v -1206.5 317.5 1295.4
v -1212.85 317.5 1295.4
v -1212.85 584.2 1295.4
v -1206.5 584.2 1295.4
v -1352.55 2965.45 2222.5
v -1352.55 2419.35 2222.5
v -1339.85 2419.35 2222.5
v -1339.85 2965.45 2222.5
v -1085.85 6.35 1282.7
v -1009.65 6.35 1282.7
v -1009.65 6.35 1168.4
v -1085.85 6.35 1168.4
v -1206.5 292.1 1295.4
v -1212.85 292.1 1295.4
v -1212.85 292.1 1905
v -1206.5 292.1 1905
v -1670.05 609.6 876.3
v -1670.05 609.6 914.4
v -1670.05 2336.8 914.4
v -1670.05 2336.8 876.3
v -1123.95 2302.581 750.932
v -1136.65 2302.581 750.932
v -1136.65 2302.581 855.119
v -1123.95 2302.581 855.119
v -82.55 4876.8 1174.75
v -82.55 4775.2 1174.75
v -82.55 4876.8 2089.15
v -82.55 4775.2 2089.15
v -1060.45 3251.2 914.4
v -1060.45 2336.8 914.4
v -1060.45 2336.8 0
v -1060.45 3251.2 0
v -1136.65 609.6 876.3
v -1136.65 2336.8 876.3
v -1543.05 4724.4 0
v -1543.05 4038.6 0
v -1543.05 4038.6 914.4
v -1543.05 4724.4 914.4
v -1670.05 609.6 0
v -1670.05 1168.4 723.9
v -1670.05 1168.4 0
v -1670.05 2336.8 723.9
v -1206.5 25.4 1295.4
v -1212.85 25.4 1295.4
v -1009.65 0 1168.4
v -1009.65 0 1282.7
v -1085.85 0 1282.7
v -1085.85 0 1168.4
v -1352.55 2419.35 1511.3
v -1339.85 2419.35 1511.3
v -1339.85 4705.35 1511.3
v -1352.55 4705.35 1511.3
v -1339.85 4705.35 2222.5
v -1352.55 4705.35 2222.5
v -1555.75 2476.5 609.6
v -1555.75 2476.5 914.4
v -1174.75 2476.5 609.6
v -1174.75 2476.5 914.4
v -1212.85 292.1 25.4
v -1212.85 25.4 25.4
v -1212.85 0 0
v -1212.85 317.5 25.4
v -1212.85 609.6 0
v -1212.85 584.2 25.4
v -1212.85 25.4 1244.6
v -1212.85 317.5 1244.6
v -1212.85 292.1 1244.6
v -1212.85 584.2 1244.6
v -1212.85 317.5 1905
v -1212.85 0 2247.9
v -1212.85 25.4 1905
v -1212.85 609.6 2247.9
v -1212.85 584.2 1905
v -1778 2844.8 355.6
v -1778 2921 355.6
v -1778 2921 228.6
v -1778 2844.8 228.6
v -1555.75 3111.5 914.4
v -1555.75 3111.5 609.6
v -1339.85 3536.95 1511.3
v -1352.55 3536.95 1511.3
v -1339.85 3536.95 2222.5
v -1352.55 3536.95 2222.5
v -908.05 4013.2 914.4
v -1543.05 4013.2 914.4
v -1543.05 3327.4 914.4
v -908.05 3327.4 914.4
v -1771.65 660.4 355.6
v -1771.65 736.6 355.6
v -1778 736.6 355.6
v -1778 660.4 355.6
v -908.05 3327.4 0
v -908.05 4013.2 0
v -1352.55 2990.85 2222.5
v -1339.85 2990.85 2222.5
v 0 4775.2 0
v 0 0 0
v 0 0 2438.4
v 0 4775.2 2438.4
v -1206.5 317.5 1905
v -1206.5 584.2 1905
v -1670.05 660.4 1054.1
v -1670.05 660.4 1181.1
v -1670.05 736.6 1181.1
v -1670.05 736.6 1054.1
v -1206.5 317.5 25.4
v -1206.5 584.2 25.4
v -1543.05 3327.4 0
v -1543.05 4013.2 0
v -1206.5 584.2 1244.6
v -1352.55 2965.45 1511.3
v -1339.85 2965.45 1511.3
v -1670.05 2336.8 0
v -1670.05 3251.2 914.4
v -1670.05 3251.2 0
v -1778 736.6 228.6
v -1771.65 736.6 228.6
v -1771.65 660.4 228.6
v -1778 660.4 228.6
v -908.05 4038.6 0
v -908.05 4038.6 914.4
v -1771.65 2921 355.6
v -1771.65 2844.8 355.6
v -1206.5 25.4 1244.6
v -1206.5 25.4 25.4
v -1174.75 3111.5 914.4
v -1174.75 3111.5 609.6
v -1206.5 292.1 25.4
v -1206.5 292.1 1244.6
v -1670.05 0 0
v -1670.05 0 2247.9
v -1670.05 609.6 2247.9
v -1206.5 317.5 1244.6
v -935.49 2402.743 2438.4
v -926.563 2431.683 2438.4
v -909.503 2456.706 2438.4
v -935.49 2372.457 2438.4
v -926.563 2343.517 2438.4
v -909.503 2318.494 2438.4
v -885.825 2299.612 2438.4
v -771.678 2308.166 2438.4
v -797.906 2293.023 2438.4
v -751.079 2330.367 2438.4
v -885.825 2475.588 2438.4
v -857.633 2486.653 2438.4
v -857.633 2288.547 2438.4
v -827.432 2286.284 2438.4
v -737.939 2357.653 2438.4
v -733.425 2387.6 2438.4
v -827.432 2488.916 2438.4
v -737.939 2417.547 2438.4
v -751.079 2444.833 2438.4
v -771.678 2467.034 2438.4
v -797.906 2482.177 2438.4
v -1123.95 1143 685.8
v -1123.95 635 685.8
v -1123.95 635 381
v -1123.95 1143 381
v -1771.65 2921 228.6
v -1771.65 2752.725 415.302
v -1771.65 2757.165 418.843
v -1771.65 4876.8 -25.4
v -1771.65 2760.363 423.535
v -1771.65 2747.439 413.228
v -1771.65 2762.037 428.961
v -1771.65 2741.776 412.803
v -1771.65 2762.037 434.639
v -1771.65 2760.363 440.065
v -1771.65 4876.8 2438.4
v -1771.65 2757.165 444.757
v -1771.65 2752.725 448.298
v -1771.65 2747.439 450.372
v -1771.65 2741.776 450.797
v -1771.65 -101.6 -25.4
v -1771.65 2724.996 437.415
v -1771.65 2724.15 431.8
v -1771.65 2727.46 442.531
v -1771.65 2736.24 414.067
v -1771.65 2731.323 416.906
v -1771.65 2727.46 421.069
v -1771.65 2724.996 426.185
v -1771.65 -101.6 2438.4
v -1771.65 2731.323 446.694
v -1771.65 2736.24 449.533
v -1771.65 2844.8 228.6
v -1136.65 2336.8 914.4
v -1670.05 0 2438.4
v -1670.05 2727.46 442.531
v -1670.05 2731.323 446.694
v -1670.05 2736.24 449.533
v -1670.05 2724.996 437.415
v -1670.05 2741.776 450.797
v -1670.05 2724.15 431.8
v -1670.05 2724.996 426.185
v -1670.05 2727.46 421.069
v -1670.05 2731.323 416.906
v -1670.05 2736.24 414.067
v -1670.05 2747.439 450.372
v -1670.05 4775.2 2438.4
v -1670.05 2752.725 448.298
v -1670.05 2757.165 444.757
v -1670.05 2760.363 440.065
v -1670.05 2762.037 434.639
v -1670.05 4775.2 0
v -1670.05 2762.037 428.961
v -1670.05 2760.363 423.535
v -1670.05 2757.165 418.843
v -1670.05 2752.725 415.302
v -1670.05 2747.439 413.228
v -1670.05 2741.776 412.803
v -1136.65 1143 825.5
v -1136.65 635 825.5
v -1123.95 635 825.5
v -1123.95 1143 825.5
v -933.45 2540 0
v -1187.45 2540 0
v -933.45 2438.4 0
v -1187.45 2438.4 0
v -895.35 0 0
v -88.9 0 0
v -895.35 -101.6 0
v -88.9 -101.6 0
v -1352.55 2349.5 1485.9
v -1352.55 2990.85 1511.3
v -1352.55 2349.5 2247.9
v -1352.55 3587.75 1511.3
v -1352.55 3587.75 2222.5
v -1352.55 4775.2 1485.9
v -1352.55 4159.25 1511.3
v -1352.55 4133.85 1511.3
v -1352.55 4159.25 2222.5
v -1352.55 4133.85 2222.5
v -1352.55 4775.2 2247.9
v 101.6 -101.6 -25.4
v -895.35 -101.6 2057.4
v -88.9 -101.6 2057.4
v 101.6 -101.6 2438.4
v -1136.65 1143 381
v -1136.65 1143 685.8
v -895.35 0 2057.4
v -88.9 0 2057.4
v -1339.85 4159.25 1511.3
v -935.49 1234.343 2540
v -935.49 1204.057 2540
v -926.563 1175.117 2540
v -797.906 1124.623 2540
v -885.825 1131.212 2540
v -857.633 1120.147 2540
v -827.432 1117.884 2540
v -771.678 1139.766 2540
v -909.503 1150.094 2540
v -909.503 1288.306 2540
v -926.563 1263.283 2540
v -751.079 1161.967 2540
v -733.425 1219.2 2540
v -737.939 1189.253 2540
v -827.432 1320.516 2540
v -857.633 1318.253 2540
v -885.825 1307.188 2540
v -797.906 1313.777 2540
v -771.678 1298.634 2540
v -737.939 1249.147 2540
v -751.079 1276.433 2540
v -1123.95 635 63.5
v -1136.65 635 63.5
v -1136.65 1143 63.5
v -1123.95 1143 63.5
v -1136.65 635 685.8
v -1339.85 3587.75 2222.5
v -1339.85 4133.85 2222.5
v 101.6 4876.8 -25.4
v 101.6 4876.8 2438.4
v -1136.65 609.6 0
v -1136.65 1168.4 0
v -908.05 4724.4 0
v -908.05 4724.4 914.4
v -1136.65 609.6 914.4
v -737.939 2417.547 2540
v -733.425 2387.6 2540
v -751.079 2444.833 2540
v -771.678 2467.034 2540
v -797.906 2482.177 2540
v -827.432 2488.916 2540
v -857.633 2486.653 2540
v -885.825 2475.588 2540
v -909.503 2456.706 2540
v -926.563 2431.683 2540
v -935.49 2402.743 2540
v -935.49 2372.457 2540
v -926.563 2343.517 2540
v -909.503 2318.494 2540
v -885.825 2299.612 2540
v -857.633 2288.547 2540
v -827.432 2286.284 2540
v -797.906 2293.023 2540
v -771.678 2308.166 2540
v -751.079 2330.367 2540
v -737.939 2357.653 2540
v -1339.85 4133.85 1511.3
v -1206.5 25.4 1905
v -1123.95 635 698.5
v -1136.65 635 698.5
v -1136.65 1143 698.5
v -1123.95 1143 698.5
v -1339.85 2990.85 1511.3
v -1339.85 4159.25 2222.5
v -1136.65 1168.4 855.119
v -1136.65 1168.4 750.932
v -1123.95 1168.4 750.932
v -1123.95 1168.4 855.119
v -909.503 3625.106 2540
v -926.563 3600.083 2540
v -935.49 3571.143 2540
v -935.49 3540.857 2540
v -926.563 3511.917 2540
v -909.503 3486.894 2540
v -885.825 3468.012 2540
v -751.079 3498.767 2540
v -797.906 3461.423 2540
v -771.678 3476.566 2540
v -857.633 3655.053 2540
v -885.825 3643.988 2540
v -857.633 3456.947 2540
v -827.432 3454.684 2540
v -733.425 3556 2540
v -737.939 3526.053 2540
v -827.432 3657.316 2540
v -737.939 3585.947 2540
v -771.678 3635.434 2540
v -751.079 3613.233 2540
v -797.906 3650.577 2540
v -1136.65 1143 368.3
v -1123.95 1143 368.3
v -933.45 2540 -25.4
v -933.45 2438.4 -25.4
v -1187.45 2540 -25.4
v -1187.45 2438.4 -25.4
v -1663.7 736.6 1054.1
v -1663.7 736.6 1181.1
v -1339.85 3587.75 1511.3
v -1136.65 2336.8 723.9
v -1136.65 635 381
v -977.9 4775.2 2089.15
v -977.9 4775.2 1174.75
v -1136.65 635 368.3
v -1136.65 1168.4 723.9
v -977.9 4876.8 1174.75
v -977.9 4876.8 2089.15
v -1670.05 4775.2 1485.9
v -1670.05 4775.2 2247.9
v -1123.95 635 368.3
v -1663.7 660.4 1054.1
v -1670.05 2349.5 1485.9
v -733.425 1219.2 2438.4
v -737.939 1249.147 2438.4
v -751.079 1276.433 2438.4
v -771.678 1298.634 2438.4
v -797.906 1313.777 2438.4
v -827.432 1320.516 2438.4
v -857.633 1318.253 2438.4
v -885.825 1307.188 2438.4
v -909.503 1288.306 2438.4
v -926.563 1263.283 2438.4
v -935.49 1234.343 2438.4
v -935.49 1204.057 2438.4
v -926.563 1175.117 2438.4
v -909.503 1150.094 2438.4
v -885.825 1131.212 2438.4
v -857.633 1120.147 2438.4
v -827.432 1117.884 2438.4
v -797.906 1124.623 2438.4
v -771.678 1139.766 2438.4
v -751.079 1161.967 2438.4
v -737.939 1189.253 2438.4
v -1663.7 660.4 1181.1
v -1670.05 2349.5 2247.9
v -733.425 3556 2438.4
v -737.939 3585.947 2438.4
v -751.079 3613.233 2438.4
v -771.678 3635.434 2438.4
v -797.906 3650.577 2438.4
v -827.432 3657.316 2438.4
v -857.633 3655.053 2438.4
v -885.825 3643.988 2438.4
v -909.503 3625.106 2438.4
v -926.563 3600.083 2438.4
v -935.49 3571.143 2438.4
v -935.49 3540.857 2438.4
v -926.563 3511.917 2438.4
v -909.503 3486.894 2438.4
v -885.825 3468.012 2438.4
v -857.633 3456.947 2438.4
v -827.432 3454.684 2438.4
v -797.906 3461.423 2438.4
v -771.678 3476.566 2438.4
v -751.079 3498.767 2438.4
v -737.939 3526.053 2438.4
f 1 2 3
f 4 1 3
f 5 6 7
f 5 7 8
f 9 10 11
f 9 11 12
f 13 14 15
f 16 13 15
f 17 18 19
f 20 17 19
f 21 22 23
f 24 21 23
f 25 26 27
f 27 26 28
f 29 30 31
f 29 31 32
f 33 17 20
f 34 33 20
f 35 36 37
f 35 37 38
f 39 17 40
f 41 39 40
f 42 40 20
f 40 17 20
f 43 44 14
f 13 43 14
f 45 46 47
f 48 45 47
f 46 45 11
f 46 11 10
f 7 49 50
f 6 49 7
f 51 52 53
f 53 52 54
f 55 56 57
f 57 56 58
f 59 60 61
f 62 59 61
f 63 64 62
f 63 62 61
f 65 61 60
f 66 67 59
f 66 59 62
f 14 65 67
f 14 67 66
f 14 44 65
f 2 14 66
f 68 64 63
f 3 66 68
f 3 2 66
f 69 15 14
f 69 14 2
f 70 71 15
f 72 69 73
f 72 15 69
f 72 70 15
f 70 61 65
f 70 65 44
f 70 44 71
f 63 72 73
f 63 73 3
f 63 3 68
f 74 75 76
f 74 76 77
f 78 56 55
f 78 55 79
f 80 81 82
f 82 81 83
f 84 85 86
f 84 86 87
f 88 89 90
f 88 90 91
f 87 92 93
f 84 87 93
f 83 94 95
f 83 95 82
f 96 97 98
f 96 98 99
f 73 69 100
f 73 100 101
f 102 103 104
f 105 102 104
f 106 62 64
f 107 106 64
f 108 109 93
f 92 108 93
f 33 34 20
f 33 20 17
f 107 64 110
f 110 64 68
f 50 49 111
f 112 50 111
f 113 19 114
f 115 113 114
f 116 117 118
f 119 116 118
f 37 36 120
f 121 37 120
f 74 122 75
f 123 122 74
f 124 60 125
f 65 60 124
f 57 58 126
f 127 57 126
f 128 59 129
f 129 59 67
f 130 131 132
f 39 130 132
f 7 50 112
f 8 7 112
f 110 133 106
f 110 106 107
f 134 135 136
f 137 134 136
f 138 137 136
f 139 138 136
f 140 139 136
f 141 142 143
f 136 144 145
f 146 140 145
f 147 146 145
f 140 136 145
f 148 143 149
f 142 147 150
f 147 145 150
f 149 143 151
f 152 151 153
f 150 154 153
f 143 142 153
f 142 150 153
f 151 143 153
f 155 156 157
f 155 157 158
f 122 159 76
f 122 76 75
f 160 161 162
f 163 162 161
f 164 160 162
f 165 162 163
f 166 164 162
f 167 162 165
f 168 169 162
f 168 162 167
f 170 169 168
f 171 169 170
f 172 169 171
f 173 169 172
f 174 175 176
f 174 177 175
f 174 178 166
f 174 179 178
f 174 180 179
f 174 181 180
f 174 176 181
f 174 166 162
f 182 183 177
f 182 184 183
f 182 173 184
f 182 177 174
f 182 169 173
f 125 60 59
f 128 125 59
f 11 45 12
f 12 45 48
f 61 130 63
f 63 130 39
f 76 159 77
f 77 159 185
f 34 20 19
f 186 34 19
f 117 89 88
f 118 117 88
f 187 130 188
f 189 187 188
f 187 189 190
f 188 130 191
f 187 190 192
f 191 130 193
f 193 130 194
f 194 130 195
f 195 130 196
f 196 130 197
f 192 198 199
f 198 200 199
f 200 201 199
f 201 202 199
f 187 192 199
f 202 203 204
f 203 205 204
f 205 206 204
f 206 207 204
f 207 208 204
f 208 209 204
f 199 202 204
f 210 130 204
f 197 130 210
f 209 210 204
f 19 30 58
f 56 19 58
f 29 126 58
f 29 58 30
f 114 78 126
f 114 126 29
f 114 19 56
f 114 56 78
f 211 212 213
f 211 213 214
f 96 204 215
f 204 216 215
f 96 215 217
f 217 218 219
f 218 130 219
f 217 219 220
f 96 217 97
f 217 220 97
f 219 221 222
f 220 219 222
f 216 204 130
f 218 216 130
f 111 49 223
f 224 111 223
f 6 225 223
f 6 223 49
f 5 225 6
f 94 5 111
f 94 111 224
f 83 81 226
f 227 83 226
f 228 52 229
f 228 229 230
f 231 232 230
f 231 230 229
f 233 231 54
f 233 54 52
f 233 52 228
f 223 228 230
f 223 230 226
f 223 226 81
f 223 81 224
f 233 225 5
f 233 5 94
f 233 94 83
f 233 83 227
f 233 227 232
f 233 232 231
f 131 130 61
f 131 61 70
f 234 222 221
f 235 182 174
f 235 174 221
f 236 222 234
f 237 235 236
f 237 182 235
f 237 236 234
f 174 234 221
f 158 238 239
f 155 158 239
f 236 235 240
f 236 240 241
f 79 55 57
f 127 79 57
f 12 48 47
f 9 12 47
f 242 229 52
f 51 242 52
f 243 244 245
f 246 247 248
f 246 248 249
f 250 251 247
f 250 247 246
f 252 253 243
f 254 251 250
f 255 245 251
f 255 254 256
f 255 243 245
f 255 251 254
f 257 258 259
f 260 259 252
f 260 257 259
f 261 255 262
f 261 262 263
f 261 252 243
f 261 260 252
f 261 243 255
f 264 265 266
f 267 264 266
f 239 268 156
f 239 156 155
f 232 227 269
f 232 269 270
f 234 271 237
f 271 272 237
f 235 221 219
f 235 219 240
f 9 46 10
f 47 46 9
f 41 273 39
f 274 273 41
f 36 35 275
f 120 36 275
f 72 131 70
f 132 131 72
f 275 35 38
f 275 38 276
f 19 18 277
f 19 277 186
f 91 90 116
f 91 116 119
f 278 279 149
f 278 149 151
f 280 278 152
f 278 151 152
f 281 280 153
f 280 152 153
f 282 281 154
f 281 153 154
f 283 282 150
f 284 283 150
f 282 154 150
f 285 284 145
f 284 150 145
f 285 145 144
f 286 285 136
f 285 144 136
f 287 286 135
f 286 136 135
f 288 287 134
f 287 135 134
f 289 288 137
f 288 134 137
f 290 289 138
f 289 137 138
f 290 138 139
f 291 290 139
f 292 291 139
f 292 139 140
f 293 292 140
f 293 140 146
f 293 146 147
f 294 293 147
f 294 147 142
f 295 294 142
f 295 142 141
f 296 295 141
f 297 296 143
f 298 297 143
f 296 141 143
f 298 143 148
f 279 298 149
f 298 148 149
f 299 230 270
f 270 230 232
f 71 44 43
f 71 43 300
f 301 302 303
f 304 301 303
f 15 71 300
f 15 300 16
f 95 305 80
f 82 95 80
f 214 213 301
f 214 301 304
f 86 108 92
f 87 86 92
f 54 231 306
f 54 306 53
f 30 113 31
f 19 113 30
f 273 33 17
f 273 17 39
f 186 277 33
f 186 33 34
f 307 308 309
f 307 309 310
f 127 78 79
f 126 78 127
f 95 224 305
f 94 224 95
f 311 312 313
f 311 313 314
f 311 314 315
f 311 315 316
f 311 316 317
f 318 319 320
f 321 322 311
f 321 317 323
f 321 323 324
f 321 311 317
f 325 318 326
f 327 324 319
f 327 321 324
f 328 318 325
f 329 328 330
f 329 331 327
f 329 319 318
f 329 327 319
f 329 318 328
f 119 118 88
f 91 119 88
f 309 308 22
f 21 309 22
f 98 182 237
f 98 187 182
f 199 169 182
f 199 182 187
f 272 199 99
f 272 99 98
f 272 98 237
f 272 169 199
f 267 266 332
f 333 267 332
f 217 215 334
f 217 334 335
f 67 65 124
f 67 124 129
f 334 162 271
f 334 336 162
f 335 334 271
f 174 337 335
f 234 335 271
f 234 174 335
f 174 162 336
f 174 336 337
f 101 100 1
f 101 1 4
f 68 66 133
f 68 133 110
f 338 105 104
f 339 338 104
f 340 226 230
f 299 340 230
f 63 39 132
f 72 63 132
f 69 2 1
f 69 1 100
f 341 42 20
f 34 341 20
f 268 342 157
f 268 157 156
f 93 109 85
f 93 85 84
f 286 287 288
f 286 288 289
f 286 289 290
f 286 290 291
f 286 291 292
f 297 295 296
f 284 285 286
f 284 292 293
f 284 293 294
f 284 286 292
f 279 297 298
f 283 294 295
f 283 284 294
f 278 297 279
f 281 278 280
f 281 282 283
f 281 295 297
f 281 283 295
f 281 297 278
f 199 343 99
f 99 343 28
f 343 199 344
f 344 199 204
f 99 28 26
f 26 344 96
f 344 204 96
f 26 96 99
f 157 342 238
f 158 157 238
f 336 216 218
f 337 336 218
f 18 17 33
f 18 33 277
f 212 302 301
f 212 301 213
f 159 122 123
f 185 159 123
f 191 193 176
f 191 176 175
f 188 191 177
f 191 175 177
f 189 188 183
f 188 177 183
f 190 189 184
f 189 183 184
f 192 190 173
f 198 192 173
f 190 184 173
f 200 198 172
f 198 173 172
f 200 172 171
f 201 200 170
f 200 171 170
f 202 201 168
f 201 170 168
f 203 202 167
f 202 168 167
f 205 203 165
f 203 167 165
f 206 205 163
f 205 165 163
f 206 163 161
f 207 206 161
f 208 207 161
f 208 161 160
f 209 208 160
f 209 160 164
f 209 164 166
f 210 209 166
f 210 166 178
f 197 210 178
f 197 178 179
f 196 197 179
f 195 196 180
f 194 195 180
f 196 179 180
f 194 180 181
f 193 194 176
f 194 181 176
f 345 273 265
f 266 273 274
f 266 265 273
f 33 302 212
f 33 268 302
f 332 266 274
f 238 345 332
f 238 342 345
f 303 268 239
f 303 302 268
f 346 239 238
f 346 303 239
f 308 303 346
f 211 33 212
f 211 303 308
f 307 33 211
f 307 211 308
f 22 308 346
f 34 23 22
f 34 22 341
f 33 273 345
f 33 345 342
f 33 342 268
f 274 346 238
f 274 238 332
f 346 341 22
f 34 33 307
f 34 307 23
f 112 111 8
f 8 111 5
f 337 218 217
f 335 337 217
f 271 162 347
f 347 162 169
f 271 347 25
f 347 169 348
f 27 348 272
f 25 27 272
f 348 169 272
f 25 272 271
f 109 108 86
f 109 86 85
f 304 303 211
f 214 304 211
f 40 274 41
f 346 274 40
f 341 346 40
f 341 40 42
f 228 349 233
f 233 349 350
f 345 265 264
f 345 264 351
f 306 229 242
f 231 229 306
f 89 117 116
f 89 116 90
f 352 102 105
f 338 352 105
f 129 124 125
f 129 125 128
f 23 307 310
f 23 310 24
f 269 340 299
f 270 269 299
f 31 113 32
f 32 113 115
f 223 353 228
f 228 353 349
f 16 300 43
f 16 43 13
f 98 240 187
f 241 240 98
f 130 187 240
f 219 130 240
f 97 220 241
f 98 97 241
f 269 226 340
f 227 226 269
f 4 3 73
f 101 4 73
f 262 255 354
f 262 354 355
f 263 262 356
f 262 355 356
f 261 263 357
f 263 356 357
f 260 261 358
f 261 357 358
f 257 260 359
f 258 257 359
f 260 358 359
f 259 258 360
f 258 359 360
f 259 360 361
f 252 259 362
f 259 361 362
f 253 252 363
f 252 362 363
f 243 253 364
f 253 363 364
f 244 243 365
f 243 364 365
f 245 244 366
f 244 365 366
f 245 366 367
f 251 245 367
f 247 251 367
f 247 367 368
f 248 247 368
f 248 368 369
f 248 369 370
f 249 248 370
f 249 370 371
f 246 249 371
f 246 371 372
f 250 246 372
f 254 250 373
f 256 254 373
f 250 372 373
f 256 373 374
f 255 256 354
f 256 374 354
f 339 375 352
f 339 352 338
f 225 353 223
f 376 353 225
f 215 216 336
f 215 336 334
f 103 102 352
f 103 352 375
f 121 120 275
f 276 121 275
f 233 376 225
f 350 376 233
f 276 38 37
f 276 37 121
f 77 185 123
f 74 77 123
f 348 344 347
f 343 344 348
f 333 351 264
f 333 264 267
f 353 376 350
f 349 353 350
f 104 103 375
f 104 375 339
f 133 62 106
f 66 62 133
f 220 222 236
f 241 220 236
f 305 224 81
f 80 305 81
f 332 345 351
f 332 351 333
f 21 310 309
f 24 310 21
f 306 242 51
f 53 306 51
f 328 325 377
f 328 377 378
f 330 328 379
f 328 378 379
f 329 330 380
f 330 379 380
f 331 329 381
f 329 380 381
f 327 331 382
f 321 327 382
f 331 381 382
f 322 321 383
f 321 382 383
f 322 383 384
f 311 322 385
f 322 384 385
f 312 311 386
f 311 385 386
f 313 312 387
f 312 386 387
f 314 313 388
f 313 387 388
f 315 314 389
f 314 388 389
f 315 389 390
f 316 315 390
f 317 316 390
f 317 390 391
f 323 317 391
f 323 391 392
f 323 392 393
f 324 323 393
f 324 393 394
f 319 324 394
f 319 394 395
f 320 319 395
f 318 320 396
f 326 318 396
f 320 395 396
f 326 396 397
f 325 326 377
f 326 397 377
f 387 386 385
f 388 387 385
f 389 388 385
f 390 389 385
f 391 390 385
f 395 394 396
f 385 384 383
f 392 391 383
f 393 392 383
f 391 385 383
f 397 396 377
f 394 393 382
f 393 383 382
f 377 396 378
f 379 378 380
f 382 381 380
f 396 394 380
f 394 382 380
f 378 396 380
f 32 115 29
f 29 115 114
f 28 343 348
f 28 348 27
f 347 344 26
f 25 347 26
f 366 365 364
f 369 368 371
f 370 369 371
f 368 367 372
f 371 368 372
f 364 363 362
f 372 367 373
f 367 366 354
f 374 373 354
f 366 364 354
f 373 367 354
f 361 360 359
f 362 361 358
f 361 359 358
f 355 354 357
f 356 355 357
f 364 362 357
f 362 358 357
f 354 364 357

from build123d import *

# Parameters (mm, degrees)
F0_W      = 1873.25
F0_H      = 4978.4
F0_W_2    = 1670.05
F0_H_2    = 4775.2
F1_DEPTH  = 2438.4
F2_W      = 806.45
F2_H      = 2057.4
F3_DEPTH  = 101.6
F4_W      = 895.35
F4_H      = 914.4
F5_DEPTH  = 101.6
F6_W      = 1873.25
F6_H      = 4978.4
F6_W_2    = 254
F6_H_2    = 101.6
F7_DEPTH  = 25.4
F8_W      = 635
F8_H      = 685.8
F9_DEPTH  = 914.4
F10_W     = 2425.7
F10_H     = 762
F11_DEPTH = 317.5
F13_W     = 76.2
F13_H     = 114.3
F14_DEPTH = 6.35
F15_R     = 101.6
F16_DEPTH = 101.6
F17_W     = 609.6
F17_H     = 2247.9
F18_DEPTH = 457.2
F19_W     = 914.4
F19_H     = 914.4
F20_DEPTH = 609.6
F21_W     = 1727.2
F21_H     = 38.1
F22_DEPTH = 533.4
F23_W     = 1168.4
F23_H     = 152.4
F24_DEPTH = 533.4
F25_W     = 508
F25_H     = 304.8
F25_H_2   = 127
F25_W_2   = 1134.1810718536
F25_H_3   = 104.1873693466
F26_DEPTH = 12.7
F12_R     = 19.05
F27_DEPTH = 101.6
F28_W     = 266.7
F28_H     = 1219.2
F28_H_2   = 609.6
F29_DEPTH = 6.35
F30_W     = 546.1
F30_H     = 711.2
F31_DEPTH = 12.7
F32_W     = 76.2
F32_H     = 127
F33_DEPTH = 6.35
F34_W     = 76.2
F34_H     = 127
F35_DEPTH = 6.35
F36_W     = 381
F36_H     = 635
F37_DEPTH = 304.8


# Not quite as in the source:
# - a feature names something its author has since deleted; it is built from what else it names


with BuildPart() as f1:
    # F0 (on Top) → F1 (new body)
    with BuildSketch(Plane.XY):
        with Locations((-835.025, 2387.6)):
            Rectangle(F0_W, F0_H)
        with Locations((-835.025, 2387.6)):
            Rectangle(F0_W_2, F0_H_2, mode=Mode.SUBTRACT)
    extrude(amount=F1_DEPTH)

    # F2 (on face) → F3 (cut, through all)
    with BuildSketch(Plane.XZ.offset(101.6)):
        with Locations((-492.125, 1028.7)):
            Rectangle(F2_W, F2_H)
    extrude(amount=-F3_DEPTH, mode=Mode.SUBTRACT)

    # F4 (on face) → F5 (cut, through all)
    with BuildSketch(Plane.XZ.offset(-4775.2)):
        with Locations((-530.225, 1631.95)):
            Rectangle(F4_W, F4_H)
    extrude(amount=-F5_DEPTH, mode=Mode.SUBTRACT)

    # F6 (on face) → F7 (join)
    with BuildSketch(Plane(origin=(0, 0, 0), x_dir=(1, 0, 0), z_dir=(0, 0, -1))):
        with Locations((-835.025, -2387.6)):
            Rectangle(F6_W, F6_H)
        with Locations((-1060.45, -2489.2)):
            Rectangle(F6_W_2, F6_H_2, mode=Mode.SUBTRACT)
    extrude(amount=F7_DEPTH)

    # F12 (on face) → F27 (cut, through all)
    with BuildSketch(Plane(origin=(-1771.65, 0, 0), x_dir=(0, -1, 0), z_dir=(-1, 0, 0))):
        with Locations((-2743.2, 431.8)):
            Circle(F12_R)
    extrude(amount=-F27_DEPTH, mode=Mode.SUBTRACT)


with BuildPart() as f9:
    # F8 (on face) → F9 (new body)
    with BuildSketch(Plane.XY):
        with Locations((-1225.55, 4381.5)):
            Rectangle(F8_W, F8_H)
    extrude(amount=F9_DEPTH)


with BuildPart() as f9b:
    # F8 (on face) → F9, piece 2 (new body)
    with BuildSketch(Plane.XY):
        with Locations((-1225.55, 3670.3)):
            Rectangle(F8_W, F8_H)
    extrude(amount=F9_DEPTH)


with BuildPart() as f11:
    # F10 (on face) → F11 (new body)
    with BuildSketch(Plane.YZ.offset(-1670.05)):
        with Locations((3562.35, 1866.9)):
            Rectangle(F10_W, F10_H)
    extrude(amount=F11_DEPTH)

    # F30 (on face) → F31 (join)
    with BuildSketch(Plane.YZ.offset(-1352.55)):
        with Locations((2692.4, 1866.9)):
            Rectangle(F30_W, F30_H)
        with Locations((3263.9, 1866.9)):
            Rectangle(F30_W, F30_H)
        with Locations((3860.8, 1866.9)):
            Rectangle(F30_W, F30_H)
        with Locations((4432.3, 1866.9)):
            Rectangle(F30_W, F30_H)
    extrude(amount=F31_DEPTH)


with BuildPart() as f14:
    # F13 (on face) → F14 (new body)
    with BuildSketch(Plane(origin=(0, 0, 0), x_dir=(-1, 0, 0), z_dir=(0, 1, 0))):
        with Locations((1047.75, 1225.55)):
            Rectangle(F13_W, F13_H)
    extrude(amount=F14_DEPTH)


with BuildPart() as f16:
    # F15 (on face) → F16 (new body)
    with BuildSketch(Plane.XY.offset(2438.4)):
        with Locations((-835.025, 3556)):
            Circle(F15_R)
    extrude(amount=F16_DEPTH)


with BuildPart() as f16b:
    # F15 (on face) → F16, piece 2 (new body)
    with BuildSketch(Plane.XY.offset(2438.4)):
        with Locations((-835.025, 1219.2)):
            Circle(F15_R)
    extrude(amount=F16_DEPTH)


with BuildPart() as f16c:
    # F15 (on face) → F16, piece 3 (new body)
    with BuildSketch(Plane.XY.offset(2438.4)):
        with Locations((-835.025, 2387.6)):
            Circle(F15_R)
    extrude(amount=F16_DEPTH)


with BuildPart() as f18:
    # F17 (on face) → F18 (new body)
    with BuildSketch(Plane.YZ.offset(-1670.05)):
        with Locations((304.8, 1123.95)):
            Rectangle(F17_W, F17_H)
    extrude(amount=F18_DEPTH)

    # F28 (on face) → F29 (join)
    with BuildSketch(Plane.YZ.offset(-1212.85)):
        with Locations((158.75, 635)):
            Rectangle(F28_W, F28_H)
        with Locations((450.85, 635)):
            Rectangle(F28_W, F28_H)
        with Locations((158.75, 1600.2)):
            Rectangle(F28_W, F28_H_2)
        with Locations((450.85, 1600.2)):
            Rectangle(F28_W, F28_H_2)
    extrude(amount=F29_DEPTH)


with BuildPart() as f20:
    # F19 (on face) → F20 (new body)
    with BuildSketch(Plane.YZ.offset(-1670.05)):
        with Locations((2794, 457.2)):
            Rectangle(F19_W, F19_H)
    extrude(amount=F20_DEPTH)

    # F36 (on face) → F37 (cut)
    with BuildSketch(Plane.XY.offset(914.4)):
        with Locations((-1365.25, 2794)):
            Rectangle(F36_W, F36_H)
    extrude(amount=-F37_DEPTH, mode=Mode.SUBTRACT)


with BuildPart() as f22:
    # F21 (on face) → F22 (new body)
    with BuildSketch(Plane.YZ.offset(-1670.05)):
        with Locations((1473.2, 895.35)):
            Rectangle(F21_W, F21_H)
    extrude(amount=F22_DEPTH)


with BuildPart() as f24:
    # F23 (on face) → F24 (new body, through all)
    with BuildSketch(Plane.YZ.offset(-1136.65)):
        Polygon((1168.4, 876.3), (609.6, 876.3), (609.6, 0), (1168.4, 0), (1168.4, 723.9), align=None)
        with Locations((1752.6, 800.1)):
            Rectangle(F23_W, F23_H)
    extrude(amount=-F24_DEPTH)

    # F25 (on face) → F26 (join)
    with BuildSketch(Plane.YZ.offset(-1136.65)):
        with Locations((889, 215.9)):
            Rectangle(F25_W, F25_H)
        with Locations((889, 533.4)):
            Rectangle(F25_W, F25_H)
        with Locations((889, 762)):
            Rectangle(F25_W, F25_H_2)
        with Locations((1735.4905359268, 803.0257225037)):
            Rectangle(F25_W_2, F25_H_3)
    extrude(amount=F26_DEPTH)


with BuildPart() as f33:
    # F32 (on face) → F33 (new body)
    with BuildSketch(Plane(origin=(-1771.65, 0, 0), x_dir=(0, -1, 0), z_dir=(-1, 0, 0))):
        with Locations((-698.5, 292.1)):
            Rectangle(F32_W, F32_H)
    extrude(amount=F33_DEPTH)


with BuildPart() as f33b:
    # F32 (on face) → F33, piece 2 (new body)
    with BuildSketch(Plane(origin=(-1771.65, 0, 0), x_dir=(0, -1, 0), z_dir=(-1, 0, 0))):
        with Locations((-2882.9, 292.1)):
            Rectangle(F32_W, F32_H)
    extrude(amount=F33_DEPTH)


with BuildPart() as f35:
    # F34 (on face) → F35 (new body)
    with BuildSketch(Plane.YZ.offset(-1670.05)):
        with Locations((698.5, 1117.6)):
            Rectangle(F34_W, F34_H)
    extrude(amount=F35_DEPTH)


solid = Compound([f1.part, f9.part, f9b.part, f11.part, f14.part, f16.part, f16b.part, f16c.part, f18.part, f20.part, f22.part, f24.part, f33.part, f33b.part, f35.part])
